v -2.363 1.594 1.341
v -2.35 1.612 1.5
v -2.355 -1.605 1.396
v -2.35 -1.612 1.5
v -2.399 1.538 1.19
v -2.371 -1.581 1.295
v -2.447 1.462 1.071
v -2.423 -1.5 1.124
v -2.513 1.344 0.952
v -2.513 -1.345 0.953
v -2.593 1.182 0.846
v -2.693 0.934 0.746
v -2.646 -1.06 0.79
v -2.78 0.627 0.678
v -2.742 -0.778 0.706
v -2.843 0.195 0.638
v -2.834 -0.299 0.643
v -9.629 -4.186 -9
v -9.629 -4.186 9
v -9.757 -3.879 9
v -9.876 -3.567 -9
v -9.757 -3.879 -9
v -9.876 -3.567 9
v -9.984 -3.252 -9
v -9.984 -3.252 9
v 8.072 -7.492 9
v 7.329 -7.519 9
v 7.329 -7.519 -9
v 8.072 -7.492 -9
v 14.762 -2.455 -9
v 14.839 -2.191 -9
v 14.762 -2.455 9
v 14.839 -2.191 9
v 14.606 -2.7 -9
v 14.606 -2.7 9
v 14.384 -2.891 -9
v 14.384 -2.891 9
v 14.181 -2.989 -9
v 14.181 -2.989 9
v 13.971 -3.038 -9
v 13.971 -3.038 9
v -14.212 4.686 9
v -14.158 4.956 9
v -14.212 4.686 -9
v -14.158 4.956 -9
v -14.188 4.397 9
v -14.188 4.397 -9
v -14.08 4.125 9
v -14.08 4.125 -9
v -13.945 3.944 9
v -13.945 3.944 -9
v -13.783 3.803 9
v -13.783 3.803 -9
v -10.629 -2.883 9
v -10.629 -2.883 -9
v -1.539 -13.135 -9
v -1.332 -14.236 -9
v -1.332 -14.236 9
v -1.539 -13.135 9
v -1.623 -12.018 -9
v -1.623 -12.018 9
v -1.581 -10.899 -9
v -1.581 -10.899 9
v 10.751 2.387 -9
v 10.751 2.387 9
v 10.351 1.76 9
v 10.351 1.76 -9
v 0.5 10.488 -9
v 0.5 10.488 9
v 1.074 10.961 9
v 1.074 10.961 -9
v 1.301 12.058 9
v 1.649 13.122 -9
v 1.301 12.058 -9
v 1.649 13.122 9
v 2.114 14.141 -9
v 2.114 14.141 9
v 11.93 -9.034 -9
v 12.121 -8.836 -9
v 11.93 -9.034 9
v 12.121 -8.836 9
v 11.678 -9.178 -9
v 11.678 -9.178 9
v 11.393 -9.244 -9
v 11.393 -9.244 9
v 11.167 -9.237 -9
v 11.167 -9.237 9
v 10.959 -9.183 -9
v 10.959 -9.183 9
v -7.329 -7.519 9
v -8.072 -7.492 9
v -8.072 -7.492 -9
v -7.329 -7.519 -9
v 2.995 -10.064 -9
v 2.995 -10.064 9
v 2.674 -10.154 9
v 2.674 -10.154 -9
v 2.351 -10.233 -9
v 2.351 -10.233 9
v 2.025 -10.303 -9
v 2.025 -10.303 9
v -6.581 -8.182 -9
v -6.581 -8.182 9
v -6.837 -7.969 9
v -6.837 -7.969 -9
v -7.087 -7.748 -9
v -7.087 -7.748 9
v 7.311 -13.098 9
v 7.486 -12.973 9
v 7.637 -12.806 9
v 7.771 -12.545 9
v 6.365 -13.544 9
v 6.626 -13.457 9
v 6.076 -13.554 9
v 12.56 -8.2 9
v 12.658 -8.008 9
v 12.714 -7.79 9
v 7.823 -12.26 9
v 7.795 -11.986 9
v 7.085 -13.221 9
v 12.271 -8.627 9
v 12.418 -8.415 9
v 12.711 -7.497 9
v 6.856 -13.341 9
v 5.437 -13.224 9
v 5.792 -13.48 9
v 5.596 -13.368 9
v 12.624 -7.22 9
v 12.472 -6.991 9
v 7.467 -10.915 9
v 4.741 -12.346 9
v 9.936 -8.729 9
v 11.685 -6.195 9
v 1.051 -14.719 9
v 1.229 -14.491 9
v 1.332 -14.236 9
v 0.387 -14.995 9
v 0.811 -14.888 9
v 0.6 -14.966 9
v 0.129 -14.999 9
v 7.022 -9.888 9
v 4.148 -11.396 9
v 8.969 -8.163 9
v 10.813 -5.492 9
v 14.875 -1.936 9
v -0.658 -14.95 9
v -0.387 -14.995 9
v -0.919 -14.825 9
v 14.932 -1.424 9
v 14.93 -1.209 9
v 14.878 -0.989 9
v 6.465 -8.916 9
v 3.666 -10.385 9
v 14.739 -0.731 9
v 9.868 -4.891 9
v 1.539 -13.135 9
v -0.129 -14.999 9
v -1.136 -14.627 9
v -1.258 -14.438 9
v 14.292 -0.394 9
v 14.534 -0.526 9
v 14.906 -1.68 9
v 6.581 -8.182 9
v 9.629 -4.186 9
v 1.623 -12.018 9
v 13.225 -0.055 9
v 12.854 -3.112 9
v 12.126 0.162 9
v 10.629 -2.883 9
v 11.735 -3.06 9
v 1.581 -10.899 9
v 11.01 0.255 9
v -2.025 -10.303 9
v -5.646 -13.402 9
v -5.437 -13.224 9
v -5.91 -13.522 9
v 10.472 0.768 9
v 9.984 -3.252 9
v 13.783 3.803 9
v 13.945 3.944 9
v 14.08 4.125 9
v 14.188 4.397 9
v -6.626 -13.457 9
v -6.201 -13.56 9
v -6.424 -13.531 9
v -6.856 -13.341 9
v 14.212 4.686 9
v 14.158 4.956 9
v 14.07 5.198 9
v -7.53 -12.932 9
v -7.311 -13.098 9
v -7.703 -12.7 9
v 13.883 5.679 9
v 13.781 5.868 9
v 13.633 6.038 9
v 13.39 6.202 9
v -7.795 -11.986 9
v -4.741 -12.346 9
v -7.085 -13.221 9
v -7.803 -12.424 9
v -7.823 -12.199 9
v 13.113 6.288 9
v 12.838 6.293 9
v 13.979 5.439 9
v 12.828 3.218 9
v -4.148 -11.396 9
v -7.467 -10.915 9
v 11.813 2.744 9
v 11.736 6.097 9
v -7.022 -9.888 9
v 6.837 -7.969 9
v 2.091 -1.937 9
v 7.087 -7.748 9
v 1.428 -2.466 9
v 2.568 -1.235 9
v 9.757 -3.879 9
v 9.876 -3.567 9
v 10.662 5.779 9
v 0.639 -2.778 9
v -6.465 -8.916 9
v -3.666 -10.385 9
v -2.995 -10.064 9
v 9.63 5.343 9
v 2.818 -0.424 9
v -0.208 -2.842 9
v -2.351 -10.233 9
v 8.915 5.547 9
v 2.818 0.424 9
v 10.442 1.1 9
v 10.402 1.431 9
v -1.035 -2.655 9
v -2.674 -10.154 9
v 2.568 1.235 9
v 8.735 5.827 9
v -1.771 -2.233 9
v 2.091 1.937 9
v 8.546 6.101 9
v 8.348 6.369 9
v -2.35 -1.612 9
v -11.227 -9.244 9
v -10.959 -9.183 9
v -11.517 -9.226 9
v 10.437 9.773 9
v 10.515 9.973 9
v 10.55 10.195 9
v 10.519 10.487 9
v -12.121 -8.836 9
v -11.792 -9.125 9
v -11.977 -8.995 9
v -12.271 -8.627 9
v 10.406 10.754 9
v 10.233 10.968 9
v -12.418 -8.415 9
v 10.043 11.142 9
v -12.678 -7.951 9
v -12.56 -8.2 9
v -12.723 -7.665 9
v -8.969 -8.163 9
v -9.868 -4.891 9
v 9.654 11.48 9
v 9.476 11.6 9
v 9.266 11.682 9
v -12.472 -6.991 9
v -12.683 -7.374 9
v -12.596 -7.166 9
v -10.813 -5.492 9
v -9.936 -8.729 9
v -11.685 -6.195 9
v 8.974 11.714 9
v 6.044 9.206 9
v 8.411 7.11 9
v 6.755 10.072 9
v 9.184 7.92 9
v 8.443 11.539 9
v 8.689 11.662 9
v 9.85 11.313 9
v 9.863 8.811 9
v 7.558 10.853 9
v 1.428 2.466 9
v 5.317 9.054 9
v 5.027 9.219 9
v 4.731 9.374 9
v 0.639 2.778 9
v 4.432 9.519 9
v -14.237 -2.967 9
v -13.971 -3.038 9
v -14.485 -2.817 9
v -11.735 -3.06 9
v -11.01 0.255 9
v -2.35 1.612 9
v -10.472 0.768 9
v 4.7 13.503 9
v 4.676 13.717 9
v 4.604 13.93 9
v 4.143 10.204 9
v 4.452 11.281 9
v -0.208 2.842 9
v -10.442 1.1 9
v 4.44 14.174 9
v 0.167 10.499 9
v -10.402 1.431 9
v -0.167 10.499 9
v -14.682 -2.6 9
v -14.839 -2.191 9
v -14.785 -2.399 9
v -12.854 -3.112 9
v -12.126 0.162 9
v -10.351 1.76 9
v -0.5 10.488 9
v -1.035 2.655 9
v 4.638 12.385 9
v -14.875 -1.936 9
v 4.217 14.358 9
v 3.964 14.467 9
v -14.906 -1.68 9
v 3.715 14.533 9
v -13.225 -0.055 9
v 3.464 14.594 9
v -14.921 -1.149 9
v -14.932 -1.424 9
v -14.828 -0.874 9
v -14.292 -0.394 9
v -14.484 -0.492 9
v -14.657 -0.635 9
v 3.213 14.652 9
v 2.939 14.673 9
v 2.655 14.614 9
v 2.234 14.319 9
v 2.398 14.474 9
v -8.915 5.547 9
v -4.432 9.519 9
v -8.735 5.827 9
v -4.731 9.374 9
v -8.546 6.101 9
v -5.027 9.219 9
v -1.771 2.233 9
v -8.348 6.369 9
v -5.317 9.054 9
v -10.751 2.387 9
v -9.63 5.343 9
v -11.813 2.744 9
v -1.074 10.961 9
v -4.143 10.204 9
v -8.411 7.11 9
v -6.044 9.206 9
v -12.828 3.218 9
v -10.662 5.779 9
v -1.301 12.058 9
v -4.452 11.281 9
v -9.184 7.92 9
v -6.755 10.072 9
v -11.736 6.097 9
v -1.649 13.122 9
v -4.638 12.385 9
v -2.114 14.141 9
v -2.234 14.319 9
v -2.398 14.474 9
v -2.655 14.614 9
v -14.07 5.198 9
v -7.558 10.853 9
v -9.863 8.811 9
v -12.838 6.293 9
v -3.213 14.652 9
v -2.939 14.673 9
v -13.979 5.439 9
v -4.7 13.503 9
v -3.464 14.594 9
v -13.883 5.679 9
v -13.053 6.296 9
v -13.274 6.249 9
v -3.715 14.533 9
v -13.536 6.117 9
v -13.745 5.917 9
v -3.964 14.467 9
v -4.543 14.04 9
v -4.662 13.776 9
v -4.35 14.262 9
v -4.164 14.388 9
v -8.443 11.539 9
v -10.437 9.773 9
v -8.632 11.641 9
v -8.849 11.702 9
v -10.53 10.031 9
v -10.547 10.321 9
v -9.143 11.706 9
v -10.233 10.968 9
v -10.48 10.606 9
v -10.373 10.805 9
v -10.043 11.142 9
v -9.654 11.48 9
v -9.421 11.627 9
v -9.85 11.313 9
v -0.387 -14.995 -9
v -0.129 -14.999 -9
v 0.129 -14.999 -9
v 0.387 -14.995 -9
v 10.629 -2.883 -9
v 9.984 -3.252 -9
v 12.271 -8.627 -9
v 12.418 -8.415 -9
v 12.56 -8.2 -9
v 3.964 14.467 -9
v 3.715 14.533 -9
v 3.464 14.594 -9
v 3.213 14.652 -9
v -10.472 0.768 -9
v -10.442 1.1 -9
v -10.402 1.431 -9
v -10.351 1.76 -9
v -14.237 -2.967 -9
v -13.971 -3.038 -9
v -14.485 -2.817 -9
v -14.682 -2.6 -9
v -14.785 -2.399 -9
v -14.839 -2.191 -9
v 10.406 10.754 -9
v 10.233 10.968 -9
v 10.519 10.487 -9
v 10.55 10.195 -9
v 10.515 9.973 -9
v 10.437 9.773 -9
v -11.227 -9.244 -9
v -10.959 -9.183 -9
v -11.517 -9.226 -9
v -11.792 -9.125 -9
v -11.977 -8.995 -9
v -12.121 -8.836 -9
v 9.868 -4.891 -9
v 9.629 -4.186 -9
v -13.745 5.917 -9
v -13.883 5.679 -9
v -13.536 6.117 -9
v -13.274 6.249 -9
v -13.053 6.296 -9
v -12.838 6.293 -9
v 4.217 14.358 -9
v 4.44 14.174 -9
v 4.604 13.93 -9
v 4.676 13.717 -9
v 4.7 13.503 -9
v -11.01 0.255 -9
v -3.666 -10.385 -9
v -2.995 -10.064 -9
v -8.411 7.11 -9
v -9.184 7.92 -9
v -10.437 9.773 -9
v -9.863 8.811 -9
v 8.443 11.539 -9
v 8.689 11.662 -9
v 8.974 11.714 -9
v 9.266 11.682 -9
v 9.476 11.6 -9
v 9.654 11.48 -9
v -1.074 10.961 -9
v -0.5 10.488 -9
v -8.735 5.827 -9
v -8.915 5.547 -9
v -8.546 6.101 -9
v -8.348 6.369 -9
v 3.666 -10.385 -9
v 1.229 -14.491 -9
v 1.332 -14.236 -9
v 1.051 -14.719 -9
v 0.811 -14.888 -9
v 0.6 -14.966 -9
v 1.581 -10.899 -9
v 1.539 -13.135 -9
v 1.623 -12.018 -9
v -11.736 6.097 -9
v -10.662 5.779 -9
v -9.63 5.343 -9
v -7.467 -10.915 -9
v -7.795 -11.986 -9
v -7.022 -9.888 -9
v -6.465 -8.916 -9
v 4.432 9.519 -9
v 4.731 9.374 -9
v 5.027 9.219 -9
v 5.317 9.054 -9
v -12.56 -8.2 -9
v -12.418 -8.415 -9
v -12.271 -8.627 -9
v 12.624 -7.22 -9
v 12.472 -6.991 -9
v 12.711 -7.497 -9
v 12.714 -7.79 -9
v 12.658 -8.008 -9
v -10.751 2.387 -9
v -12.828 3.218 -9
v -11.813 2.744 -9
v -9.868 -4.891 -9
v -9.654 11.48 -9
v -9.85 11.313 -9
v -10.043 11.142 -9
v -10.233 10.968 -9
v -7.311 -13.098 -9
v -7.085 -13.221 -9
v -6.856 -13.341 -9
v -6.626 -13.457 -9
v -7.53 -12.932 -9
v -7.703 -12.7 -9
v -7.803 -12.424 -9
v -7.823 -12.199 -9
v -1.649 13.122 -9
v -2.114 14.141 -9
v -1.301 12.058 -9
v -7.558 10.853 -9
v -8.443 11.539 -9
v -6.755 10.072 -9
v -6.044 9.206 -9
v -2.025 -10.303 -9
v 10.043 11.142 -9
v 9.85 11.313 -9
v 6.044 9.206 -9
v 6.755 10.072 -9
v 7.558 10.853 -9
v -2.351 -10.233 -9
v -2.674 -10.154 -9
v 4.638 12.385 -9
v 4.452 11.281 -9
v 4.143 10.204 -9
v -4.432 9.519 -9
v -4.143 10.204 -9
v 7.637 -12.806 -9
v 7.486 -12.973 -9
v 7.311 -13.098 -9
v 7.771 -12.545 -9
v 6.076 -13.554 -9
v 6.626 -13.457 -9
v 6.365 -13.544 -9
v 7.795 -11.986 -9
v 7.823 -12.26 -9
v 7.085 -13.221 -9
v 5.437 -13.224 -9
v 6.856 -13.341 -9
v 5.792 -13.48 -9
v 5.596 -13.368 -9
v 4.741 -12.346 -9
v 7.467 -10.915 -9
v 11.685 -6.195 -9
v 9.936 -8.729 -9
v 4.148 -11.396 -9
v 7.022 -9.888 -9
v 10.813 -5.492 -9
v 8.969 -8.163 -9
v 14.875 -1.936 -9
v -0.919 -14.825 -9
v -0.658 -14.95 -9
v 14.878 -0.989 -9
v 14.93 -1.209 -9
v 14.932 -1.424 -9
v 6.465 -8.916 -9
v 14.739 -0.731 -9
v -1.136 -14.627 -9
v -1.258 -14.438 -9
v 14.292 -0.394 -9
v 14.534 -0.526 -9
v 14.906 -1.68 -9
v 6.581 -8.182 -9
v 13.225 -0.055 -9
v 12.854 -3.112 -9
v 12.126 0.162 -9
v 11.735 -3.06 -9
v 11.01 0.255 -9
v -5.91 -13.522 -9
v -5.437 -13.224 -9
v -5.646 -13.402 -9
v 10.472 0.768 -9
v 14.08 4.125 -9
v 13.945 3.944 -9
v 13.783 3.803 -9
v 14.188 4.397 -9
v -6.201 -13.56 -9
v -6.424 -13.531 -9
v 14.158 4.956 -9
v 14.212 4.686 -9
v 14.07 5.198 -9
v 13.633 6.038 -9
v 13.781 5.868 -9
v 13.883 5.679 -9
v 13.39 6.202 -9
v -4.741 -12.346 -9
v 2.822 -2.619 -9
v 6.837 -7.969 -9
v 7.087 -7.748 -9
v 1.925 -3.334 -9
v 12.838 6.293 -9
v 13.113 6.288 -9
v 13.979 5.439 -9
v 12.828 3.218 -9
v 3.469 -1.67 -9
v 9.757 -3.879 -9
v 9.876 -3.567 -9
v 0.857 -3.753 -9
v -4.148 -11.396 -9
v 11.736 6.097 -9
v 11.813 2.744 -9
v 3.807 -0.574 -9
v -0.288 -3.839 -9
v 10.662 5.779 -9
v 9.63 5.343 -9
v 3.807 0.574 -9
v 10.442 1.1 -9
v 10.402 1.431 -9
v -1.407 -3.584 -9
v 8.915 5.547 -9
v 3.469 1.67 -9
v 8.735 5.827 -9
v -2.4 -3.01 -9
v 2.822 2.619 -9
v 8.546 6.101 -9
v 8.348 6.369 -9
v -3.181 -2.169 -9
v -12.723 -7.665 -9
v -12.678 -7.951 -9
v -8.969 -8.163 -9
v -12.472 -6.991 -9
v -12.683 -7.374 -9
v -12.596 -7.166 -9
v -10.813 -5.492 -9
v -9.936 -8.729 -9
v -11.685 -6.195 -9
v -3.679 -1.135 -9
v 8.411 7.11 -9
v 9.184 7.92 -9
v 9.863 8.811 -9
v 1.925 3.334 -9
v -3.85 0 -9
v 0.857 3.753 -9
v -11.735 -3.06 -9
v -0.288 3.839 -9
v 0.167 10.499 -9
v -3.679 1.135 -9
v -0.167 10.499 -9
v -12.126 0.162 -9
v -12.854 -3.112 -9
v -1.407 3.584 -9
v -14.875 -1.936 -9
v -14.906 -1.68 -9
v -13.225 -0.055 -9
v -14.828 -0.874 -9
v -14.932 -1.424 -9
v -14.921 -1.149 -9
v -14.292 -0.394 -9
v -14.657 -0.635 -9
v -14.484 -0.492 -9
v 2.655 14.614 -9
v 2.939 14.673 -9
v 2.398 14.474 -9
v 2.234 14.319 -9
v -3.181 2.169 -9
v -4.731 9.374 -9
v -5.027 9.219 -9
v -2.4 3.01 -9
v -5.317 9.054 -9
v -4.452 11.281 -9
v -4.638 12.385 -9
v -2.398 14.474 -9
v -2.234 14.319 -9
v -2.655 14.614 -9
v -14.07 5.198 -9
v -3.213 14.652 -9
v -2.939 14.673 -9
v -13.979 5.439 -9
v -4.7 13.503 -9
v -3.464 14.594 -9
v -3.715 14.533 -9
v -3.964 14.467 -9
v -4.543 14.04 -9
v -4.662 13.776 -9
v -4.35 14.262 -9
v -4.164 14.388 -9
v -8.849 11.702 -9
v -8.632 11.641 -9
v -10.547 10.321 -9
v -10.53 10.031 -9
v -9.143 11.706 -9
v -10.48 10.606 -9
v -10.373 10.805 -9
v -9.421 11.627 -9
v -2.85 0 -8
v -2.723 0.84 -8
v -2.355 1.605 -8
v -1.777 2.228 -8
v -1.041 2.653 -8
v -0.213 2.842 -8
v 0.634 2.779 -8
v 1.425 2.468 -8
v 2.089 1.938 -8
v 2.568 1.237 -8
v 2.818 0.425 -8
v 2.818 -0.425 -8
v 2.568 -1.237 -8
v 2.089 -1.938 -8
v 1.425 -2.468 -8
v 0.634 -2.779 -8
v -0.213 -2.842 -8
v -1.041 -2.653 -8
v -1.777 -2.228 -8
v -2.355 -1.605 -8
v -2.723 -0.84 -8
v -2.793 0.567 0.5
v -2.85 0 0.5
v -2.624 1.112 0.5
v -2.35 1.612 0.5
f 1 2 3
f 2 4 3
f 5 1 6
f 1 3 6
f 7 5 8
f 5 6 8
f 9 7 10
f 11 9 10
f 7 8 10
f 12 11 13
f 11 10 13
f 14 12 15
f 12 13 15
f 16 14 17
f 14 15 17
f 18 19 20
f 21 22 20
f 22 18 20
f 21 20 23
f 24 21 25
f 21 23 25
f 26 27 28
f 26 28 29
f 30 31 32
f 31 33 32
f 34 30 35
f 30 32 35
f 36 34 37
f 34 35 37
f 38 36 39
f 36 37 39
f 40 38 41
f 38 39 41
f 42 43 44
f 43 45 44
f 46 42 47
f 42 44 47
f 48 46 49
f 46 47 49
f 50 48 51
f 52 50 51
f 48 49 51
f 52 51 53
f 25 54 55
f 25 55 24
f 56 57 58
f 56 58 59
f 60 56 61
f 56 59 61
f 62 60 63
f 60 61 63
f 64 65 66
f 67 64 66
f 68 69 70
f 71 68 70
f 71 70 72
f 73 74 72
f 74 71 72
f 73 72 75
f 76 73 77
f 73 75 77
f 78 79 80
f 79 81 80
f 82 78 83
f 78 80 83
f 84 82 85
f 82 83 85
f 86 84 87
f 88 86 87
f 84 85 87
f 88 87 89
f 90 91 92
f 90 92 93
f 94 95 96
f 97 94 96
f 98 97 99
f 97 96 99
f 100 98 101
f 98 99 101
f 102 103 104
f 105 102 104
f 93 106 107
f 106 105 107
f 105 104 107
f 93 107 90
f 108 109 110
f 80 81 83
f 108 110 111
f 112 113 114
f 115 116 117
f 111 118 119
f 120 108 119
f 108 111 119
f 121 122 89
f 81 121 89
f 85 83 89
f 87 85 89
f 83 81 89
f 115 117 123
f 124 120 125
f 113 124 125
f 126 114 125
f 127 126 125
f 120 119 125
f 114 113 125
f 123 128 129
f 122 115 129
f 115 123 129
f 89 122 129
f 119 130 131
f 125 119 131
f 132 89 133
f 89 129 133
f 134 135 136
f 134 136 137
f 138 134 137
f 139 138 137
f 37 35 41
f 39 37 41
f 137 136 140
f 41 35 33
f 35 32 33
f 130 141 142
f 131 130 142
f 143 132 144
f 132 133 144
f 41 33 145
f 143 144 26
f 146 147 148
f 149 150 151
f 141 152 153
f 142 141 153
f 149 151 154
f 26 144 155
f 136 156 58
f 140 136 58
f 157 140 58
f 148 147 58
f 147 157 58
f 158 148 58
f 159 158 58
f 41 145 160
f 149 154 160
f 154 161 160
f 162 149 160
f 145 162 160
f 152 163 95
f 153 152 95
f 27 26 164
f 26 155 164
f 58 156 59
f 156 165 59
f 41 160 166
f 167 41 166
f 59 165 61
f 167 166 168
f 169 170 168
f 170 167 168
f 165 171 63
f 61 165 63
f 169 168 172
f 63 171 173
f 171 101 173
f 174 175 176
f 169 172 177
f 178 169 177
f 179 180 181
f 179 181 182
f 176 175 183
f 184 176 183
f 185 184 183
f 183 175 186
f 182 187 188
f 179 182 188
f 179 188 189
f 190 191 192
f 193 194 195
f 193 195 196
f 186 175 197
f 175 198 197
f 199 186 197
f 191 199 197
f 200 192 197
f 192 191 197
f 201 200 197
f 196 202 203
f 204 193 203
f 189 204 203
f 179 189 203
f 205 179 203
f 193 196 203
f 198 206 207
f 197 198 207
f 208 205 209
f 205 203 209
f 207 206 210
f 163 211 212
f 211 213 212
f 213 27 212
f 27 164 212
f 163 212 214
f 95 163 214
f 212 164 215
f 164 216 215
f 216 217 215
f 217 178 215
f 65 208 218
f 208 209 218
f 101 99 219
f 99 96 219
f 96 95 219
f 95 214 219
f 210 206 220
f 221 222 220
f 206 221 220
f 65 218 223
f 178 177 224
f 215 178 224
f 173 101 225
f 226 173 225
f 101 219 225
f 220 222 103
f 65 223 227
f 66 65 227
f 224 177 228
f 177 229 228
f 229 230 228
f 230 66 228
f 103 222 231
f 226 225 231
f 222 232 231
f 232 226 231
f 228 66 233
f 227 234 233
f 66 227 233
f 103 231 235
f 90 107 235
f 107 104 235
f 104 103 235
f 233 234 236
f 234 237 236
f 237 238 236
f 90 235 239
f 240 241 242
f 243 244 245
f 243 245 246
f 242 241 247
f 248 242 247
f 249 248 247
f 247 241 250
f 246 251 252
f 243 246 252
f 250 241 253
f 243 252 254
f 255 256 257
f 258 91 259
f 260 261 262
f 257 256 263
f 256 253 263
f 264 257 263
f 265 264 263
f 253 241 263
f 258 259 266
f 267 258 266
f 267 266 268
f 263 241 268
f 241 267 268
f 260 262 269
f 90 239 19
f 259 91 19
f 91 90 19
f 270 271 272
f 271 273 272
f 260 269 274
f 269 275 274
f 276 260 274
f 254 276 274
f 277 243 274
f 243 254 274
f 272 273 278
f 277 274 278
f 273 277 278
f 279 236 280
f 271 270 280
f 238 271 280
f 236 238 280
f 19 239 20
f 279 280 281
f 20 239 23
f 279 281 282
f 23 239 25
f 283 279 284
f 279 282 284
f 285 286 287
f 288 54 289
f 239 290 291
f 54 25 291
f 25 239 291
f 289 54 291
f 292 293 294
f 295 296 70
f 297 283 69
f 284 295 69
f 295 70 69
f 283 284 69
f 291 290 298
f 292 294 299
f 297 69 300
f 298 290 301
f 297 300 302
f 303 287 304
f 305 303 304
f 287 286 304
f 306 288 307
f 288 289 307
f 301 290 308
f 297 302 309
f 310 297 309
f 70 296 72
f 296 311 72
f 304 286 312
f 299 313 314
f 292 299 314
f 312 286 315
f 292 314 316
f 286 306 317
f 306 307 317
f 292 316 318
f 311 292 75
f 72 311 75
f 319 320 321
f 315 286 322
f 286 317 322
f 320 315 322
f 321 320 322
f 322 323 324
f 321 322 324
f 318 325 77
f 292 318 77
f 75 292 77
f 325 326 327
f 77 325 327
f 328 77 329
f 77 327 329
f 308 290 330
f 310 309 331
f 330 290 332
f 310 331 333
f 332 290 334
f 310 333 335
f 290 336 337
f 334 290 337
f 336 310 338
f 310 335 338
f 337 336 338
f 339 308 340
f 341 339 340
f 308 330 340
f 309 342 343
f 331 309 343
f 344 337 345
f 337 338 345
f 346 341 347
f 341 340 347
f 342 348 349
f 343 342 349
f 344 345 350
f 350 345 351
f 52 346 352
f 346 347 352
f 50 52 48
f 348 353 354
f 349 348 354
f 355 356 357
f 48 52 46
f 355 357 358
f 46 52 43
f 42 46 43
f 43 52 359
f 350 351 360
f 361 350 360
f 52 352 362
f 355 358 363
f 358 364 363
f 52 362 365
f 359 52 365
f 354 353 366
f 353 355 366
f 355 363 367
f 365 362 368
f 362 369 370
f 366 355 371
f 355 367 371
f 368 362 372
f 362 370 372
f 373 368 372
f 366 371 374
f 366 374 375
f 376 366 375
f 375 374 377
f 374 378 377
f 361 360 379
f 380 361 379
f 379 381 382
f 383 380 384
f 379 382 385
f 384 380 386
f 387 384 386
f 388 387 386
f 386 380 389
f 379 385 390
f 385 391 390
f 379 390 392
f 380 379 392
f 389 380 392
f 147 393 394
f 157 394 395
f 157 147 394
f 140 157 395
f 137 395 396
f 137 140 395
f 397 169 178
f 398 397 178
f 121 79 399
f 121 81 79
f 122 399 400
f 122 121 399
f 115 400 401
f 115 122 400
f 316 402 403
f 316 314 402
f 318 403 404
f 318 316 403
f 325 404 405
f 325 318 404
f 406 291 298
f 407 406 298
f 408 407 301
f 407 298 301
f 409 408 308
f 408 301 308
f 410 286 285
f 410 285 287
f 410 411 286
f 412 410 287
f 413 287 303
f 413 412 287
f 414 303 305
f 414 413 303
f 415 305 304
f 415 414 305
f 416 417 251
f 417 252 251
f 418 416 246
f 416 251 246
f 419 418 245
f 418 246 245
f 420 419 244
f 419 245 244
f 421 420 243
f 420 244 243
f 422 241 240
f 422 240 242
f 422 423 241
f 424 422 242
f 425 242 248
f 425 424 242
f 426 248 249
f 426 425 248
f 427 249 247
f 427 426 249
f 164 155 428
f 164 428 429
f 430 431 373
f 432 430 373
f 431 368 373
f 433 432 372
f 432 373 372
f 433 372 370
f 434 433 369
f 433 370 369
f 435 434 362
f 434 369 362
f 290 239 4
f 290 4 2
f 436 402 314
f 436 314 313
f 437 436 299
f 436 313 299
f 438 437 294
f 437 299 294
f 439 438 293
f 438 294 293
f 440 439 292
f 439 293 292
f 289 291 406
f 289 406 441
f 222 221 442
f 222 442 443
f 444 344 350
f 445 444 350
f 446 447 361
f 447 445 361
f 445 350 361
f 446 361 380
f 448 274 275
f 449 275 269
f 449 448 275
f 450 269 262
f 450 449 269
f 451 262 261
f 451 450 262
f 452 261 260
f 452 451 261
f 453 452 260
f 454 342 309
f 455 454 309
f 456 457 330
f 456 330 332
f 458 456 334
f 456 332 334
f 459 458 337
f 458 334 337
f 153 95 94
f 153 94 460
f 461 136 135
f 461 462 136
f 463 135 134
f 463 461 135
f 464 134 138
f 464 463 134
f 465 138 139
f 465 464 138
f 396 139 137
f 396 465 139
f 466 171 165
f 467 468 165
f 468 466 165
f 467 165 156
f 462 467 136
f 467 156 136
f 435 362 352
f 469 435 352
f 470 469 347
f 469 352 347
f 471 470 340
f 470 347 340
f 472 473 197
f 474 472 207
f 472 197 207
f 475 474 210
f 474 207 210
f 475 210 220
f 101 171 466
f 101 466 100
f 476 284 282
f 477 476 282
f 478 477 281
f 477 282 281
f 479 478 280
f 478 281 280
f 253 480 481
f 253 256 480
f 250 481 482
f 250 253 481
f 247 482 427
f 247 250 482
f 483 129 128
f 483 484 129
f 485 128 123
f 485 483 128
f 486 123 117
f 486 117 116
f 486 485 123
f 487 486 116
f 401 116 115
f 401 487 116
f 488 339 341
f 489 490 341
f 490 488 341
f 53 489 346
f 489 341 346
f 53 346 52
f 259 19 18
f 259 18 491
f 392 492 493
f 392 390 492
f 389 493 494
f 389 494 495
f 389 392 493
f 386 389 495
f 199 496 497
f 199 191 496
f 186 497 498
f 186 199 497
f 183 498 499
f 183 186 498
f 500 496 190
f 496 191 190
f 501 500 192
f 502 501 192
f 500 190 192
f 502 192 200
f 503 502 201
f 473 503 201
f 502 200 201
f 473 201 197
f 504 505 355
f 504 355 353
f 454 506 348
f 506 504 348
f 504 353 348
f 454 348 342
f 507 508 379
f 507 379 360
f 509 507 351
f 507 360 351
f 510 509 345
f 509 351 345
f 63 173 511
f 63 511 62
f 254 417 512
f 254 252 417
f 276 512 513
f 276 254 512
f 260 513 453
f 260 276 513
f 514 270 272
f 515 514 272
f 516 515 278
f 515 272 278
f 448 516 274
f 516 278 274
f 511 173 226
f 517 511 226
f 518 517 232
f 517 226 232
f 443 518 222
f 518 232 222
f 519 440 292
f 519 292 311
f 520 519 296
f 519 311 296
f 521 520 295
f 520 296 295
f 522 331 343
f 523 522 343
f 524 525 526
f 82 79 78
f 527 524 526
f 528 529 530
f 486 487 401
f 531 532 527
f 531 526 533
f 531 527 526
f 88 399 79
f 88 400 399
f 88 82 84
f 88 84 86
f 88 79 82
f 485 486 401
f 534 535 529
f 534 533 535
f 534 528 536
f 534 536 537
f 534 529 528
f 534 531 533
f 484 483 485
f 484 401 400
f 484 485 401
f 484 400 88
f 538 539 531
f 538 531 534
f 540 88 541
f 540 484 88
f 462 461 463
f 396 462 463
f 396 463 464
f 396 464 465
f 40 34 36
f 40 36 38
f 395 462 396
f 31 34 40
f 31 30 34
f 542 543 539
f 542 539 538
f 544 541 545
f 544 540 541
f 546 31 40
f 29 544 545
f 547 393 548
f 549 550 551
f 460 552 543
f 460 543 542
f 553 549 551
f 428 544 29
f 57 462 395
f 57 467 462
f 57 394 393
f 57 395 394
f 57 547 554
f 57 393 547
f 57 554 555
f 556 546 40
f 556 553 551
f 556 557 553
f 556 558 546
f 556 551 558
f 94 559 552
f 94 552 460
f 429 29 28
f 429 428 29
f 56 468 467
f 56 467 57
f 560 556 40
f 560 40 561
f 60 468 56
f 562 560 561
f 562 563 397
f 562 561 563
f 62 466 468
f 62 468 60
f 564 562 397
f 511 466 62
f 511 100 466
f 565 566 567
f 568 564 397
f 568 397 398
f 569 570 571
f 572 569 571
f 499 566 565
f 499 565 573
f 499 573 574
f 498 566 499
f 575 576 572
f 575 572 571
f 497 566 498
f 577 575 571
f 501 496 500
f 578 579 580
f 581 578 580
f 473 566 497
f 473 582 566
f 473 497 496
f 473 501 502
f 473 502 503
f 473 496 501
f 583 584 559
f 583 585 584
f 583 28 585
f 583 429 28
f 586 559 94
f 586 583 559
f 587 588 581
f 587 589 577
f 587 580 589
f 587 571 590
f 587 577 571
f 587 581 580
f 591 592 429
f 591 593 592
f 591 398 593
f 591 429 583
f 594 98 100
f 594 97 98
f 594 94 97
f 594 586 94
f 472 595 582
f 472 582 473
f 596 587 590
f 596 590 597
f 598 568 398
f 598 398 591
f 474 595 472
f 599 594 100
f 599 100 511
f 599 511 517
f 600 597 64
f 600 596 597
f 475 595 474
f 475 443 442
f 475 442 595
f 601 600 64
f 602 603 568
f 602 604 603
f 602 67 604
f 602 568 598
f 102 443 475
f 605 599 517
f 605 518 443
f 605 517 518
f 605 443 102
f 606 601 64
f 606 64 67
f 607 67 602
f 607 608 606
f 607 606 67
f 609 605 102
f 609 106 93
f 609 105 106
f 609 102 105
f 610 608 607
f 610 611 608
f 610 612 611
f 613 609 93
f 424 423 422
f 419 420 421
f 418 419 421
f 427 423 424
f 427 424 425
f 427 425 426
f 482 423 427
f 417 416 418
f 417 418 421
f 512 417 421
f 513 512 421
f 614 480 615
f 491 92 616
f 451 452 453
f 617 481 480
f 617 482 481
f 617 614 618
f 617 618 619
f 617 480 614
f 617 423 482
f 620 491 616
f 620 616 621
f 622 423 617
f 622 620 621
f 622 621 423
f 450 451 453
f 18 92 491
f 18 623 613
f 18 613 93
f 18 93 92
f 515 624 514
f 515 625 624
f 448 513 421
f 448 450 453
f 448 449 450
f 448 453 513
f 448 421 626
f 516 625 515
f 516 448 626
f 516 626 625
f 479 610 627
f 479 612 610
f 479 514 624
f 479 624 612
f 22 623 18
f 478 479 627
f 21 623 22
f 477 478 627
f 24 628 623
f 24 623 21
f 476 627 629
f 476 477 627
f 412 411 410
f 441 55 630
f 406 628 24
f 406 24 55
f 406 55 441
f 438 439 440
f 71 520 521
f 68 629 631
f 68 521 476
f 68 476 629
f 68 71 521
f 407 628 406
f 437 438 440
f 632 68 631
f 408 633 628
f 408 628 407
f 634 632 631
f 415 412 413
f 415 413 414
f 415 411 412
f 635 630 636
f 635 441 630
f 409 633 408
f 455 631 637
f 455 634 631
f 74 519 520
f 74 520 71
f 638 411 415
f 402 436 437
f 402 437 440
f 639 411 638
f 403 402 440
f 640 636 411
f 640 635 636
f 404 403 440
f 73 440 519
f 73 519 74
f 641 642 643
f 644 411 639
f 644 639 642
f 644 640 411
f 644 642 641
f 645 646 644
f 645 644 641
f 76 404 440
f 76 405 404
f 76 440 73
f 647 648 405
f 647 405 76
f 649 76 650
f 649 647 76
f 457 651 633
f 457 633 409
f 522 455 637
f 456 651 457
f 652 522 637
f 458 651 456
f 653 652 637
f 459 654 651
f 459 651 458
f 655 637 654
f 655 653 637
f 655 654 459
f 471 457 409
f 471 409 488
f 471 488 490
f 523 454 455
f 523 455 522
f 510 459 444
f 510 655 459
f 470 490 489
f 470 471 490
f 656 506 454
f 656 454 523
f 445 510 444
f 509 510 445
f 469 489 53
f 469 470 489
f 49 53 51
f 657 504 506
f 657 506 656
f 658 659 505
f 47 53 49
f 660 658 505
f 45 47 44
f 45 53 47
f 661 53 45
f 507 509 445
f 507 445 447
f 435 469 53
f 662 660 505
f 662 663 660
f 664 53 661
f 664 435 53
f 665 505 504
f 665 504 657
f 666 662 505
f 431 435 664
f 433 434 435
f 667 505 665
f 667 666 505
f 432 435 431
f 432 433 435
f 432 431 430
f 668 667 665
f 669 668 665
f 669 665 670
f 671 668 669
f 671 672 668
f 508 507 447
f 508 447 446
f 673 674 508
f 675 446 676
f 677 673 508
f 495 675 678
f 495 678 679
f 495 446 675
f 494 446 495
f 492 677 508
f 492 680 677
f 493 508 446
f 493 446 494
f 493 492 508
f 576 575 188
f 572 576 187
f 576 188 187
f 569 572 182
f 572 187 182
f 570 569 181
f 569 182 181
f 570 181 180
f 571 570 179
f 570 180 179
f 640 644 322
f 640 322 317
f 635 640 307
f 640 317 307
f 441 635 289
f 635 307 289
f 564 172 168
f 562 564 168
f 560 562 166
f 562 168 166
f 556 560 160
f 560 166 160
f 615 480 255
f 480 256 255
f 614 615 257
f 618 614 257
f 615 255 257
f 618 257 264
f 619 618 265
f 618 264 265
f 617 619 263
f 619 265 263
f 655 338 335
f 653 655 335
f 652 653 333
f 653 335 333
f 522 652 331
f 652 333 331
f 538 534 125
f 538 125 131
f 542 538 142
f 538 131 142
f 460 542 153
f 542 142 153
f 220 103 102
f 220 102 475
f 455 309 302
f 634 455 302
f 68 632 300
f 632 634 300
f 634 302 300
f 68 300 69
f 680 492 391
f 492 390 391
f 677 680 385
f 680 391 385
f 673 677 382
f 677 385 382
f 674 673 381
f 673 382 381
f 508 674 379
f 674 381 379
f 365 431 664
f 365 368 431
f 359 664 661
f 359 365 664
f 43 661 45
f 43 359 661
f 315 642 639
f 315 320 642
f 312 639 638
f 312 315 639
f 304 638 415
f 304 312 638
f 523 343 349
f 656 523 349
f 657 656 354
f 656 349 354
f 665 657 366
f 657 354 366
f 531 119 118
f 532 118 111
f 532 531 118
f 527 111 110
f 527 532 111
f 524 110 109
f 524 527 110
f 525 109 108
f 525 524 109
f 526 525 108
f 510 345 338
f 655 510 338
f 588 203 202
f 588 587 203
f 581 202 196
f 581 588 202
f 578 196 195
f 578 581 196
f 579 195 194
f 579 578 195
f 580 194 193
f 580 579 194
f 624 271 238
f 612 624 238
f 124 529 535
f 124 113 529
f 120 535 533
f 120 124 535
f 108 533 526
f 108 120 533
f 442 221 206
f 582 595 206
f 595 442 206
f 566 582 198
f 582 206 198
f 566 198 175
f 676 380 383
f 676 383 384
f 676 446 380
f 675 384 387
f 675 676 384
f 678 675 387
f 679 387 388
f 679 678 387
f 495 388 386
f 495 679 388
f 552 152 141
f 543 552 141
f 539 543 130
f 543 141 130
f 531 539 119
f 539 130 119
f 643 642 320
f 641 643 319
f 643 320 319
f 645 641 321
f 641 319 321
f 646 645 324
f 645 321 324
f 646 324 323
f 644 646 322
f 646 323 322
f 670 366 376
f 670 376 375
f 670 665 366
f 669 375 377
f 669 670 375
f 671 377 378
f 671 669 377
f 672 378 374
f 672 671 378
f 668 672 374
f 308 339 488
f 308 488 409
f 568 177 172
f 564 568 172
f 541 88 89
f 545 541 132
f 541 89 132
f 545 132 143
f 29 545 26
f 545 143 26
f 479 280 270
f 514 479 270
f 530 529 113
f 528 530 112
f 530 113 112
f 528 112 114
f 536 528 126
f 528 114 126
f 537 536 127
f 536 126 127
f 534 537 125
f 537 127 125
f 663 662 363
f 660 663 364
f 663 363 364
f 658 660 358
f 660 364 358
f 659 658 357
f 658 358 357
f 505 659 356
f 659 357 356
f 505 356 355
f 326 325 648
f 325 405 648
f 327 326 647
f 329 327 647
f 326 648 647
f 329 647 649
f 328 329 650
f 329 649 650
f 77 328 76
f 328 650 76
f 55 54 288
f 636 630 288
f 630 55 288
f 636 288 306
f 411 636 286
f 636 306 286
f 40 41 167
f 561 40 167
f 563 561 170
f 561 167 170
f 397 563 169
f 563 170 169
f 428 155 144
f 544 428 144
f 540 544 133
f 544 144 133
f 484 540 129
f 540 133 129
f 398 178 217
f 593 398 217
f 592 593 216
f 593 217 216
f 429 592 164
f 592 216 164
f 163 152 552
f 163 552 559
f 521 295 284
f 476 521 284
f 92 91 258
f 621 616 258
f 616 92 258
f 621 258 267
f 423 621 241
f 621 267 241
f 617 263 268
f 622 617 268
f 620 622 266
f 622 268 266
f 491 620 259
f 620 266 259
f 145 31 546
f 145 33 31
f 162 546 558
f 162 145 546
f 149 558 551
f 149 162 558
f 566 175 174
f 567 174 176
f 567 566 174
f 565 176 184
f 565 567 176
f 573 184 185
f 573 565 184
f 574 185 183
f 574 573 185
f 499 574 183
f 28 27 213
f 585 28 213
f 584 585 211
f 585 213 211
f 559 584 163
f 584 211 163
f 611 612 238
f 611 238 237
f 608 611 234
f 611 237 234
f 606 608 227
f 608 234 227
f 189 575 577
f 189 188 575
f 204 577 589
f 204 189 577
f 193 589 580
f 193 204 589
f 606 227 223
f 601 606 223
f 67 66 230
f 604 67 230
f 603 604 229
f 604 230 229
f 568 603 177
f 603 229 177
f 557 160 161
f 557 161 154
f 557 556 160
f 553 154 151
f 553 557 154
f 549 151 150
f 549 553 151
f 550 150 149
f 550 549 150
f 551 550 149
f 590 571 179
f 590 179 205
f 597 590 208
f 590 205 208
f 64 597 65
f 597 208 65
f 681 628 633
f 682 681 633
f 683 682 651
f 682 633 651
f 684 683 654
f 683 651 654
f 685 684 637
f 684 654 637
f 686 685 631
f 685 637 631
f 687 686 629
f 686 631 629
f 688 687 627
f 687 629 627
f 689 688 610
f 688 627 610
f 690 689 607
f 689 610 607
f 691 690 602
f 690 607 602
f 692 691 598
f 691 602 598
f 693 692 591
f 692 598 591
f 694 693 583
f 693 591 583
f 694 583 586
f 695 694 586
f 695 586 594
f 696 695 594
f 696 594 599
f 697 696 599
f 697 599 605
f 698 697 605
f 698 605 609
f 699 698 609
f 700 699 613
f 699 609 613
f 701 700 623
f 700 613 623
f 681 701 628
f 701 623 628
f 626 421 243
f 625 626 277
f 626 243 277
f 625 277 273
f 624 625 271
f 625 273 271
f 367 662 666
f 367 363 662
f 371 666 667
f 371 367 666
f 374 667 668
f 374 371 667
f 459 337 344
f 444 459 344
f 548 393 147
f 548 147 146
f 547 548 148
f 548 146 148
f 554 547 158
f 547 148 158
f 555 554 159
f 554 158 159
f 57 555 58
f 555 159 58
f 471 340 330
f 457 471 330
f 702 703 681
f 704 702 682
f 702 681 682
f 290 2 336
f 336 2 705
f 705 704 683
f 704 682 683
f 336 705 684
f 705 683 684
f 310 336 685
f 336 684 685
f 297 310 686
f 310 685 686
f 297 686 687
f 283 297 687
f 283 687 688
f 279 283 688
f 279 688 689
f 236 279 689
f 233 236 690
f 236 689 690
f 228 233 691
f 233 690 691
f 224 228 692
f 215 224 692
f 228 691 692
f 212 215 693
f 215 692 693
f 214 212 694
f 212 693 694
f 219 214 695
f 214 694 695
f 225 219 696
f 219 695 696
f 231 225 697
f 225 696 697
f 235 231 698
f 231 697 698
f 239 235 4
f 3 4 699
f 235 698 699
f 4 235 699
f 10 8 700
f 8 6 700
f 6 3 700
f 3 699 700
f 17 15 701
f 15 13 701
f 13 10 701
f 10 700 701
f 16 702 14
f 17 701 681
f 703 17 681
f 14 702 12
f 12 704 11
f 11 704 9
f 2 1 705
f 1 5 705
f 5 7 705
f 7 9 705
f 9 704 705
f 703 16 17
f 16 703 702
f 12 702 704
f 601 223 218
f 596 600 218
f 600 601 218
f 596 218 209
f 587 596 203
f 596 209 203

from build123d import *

# Parameters (mm, degrees)
SKETCH1_R           = 15
BOSS_EXTRUDE1_DEPTH = 9
CUT_EXTRUDE1_DEPTH  = 24.043437244
CIRPATTERN1_COUNT   = 13
FILLET1_R           = 1
SKETCH3_R           = 2.85
CUT_EXTRUDE2_DEPTH  = 24
BOSS_EXTRUDE2_DEPTH = 8.5
FILLET3_R           = 1
CHAMFER2_SIZE       = 1


with BuildPart() as part:
    # Sketch1 → Boss-Extrude1 (new, symmetric)
    with BuildSketch(Plane.XY):
        Circle(SKETCH1_R)
    extrude(amount=BOSS_EXTRUDE1_DEPTH, both=True)

    # Sketch2 → Cut-Extrude1 (cut, symmetric)
    with BuildSketch(Plane.XY):
        with BuildLine():
            Line((2.488704723, 14.792104272), (2.488704723, 15.173999235))
            Line((2.488704723, 15.173999235), (-2.614354336, 15.173999235))
            Line((-2.614354336, 15.173999235), (-2.488704723, 14.792104272))
            ThreePointArc((-2.488704723, 14.792104272), (-1.497391845, 12.707607266), (-1.01110734, 10.451203852))
            ThreePointArc((-1.01110734, 10.451203852), (0, 10.5), (1.01110734, 10.451203852))
            ThreePointArc((1.01110734, 10.451203852), (1.497391845, 12.707607266), (2.488704723, 14.792104272))
        make_face()
    cut_extrude1 = extrude(amount=CUT_EXTRUDE1_DEPTH, both=True, mode=Mode.SUBTRACT)

    # CirPattern1: Cut-Extrude1 ×13 about axis
    cirpattern1_axis = Axis((0, 0, 0), (0, 0, 1))
    for i in range(1, CIRPATTERN1_COUNT):
        add(cut_extrude1.rotate(cirpattern1_axis, i * 360 / CIRPATTERN1_COUNT), mode=Mode.SUBTRACT)

    # Fillet1
    fillet1_edges = [part.edges().sort_by_distance(p)[0] for p in [
        (11.67180174, -9.421732544, 0),
        (7.946157272, -12.722365527, 0),
        (14.713364615, -2.918373125, 0),
        (-2.488704723, 14.792104272, 0),
        (12.948350901, -7.572331804, 0),
        (5.956369747, -13.766686582, 0),
        (1.123594773, -14.95785863, 0),
        (2.488704723, 14.792104272, 0),
        (-1.123594773, -14.95785863, 0),
        (-5.956369747, -13.766686582, 0),
        (-12.948350901, -7.572331804, 0),
        (-14.713364615, -2.918373125, 0),
        (-7.946157272, -12.722365527, 0),
        (-11.67180174, -9.421732544, 0),
        (-9.077872212, 11.941199107, 0),
        (-4.670595026, 14.254316613, 0),
        (-13.587408577, 6.354709133, 0),
        (-10.759917741, 10.451036801, 0),
        (-14.984233383, -0.68756812, 0),
        (-14.384272972, 4.253550406, 0),
        (4.670595026, 14.254316613, 0),
        (9.077872212, 11.941199107, 0),
        (10.759917741, 10.451036801, 0),
        (13.587408577, 6.354709133, 0),
        (14.384272972, 4.253550406, 0),
        (14.984233383, -0.68756812, 0),
    ]]
    fillet(fillet1_edges, radius=FILLET1_R)

    # Chamfer1
    # the kernel refuses this chamfer: 0.5 mm, written as the material it adds along each edge
    with BuildSketch(Plane(origin=(7.687254792, -7.152350227, 9), x_dir=(-0.6988462718759633, -0.7152718981513725, 0), z_dir=(0, 0, -1)), Plane(origin=(3.482863191, -9.905537037, 9), x_dir=(-0.9512010678205252, -0.3085717559613855, 0), z_dir=(0, 0, -1)), Plane(origin=(-1.519410394, -10.389484687, 9), x_dir=(-0.9856471623429421, 0.16881845682657493, 0), z_dir=(0, 0, -1)), Plane(origin=(-9.413501753, -4.651449748, 9), x_dir=(-0.42097653940929197, 0.9070715259928386, 0), z_dir=(0, 0, -1)), Plane(origin=(-6.173605368, -8.493326601, 9), x_dir=(-0.7942933703085662, 0.6075343956385179, 0), z_dir=(0, 0, -1)), Plane(origin=(-10.496878331, 0.256018188, 9), x_dir=(0.048780943351376956, 0.998809501139106, 0), z_dir=(0, 0, -1))) as chamfer1_piece_1:
        with BuildLine():
            Line((0.512668458, 0), (-0.025719054, -0.512719416))
            ThreePointArc((-0.025719054, -0.512719416), (-0.009930751, -0.26377362), (0, 0))
            ThreePointArc((0, 0), (0.263582733, -0.00312688), (0.512668458, 0))
        make_face()
    extrude(amount=18)
    with BuildSketch(Plane(origin=(6.173605368, -8.493326601, 9), x_dir=(0.5669781411868423, -0.8237328374031918, 0), z_dir=(0, 0, -1)), Plane(origin=(9.413501753, -4.651449748, 9), x_dir=(0.8848419486421701, -0.4658913241552447, 0), z_dir=(0, 0, -1)), Plane(origin=(1.519410394, -10.389484687, 9), x_dir=(0.11922647441292282, -0.9928670846589006, 0), z_dir=(0, 0, -1)), Plane(origin=(-3.482863191, -9.905537037, 9), x_dir=(-0.3558385408142222, -0.934547448164728, 0), z_dir=(0, 0, -1)), Plane(origin=(-10.130588961, -2.760646175, 9), x_dir=(-0.971256802316475, -0.23803408149669583, 0), z_dir=(0, 0, -1)), Plane(origin=(-7.687254792, -7.152350227, 9), x_dir=(-0.7493852346601237, -0.6621342538136743, 0), z_dir=(0, 0, -1)), Plane(origin=(-10.253127286, 2.263488646, 9), x_dir=(-0.9706251414754602, 0.24059683026952544, 0), z_dir=(0, 0, -1))) as chamfer1_piece_2:
        with BuildLine():
            Line((0.513364071, 0), (-0.025684204, -0.512024677))
            ThreePointArc((-0.025684204, -0.512024677), (-0.010082291, -0.263408394), (0, 0))
            ThreePointArc((0, 0), (0.263939908, -0.003296528), (0.513364071, 0))
        make_face()
    extrude(amount=18)
    with BuildSketch(Plane(origin=(-1.01110734, 10.451203852, 9), x_dir=(-0.12184667616261032, 0.9925489345660113, 0), z_dir=(0, 0, -1)), Plane(origin=(10.130588961, -2.760646175, 9), x_dir=(0.9712568023164747, -0.2380340814966975, 0), z_dir=(0, 0, -1)), Plane(origin=(-5.752207693, 8.784196415, 9), x_dir=(-0.569150362894187, 0.822233461017864, 0), z_dir=(0, 0, -1)), Plane(origin=(-9.175546584, 5.104835441, 9), x_dir=(-0.8860685604921126, 0.46355421053792145, 0), z_dir=(0, 0, -1)), Plane(origin=(3.961625519, 9.723966436, 9), x_dir=(0.35337061566617867, 0.9354834087164272, 0), z_dir=(0, 0, -1)), Plane(origin=(8.026797714, 6.769085497, 9), x_dir=(0.7476349580234212, 0.664109907727115, 0), z_dir=(0, 0, -1)), Plane(origin=(10.253127286, 2.263488646, 9), x_dir=(0.9706251414754612, 0.24059683026952128, 0), z_dir=(0, 0, -1))) as chamfer1_piece_3:
        with BuildLine():
            Line((0.513364071, 0), (-0.025684204, 0.512024677))
            ThreePointArc((-0.025684204, 0.512024677), (-0.010082291, 0.263408394), (0, 0))
            ThreePointArc((0, 0), (0.263939908, 0.003296528), (0.513364071, 0))
        make_face()
    extrude(amount=18)
    with BuildSketch(Plane(origin=(1.01110734, 10.451203852, 9), x_dir=(-0.9974069482855394, 0.07196790612298887, 0), z_dir=(0, 0, -1)), Plane(origin=(-3.961625519, 9.723966436, 9), x_dir=(-0.916605146006636, -0.39979370469550085, 0), z_dir=(0, 0, -1)), Plane(origin=(-8.026797714, 6.769085497, 9), x_dir=(-0.6258201510670891, -0.7799673958047002, 0), z_dir=(0, 0, -1)), Plane(origin=(5.752207693, 8.784196415, 9), x_dir=(-0.8497148387689841, 0.5272425369560002, 0), z_dir=(0, 0, -1)), Plane(origin=(9.175546584, 5.104835441, 9), x_dir=(-0.5073632998643495, 0.8617322565337555, 0), z_dir=(0, 0, -1)), Plane(origin=(10.496878331, 0.256018188, 9), x_dir=(-0.04878094335137992, 0.9988095011391058, 0), z_dir=(0, 0, -1))) as chamfer1_piece_4:
        with BuildLine():
            Line((0.512668458, 0), (-0.025719054, 0.512719416))
            ThreePointArc((-0.025719054, 0.512719416), (-0.009930751, 0.26377362), (0, 0))
            ThreePointArc((0, 0), (0.263582733, 0.00312688), (0.512668458, 0))
        make_face()
    extrude(amount=18)

    # Sketch3 → Cut-Extrude2 (cut)
    with BuildSketch(Plane(origin=(0, 0, -9), x_dir=(-1, 0, 0), z_dir=(0, 0, -1))):
        Circle(SKETCH3_R)
    extrude(amount=-CUT_EXTRUDE2_DEPTH, mode=Mode.SUBTRACT)

    # Sketch5 → Boss-Extrude2 (add)
    with BuildSketch(Plane.XY.offset(9)):
        Polygon((-2.35, 0), (-2.35, 1.61245155), (-2.85, 1.61245155), (-2.85, -1.61245155), (-2.35, -1.61245155), align=None)
    extrude(amount=-BOSS_EXTRUDE2_DEPTH)

    # Fillet3
    # the kernel refuses this fillet: 1 mm, written as the material it takes off along each edge
    with BuildSketch(Plane(origin=(-2.35, -4.11245155, 0.5), x_dir=(-1, 0, 0), z_dir=(0, 1, 0))) as fillet3_piece_1_section:
        with BuildLine():
            CenterArc((FILLET3_R, FILLET3_R), FILLET3_R, 180, 90)
            Line((0, FILLET3_R), (0, 0))
            Line((0, 0), (FILLET3_R, 0))
        make_face()
    fillet3_piece_1 = extrude(amount=8.224903099, mode=Mode.PRIVATE)
    fillet3_piece_1 = fillet3_piece_1 & Plane(origin=(0, 0, 0.5), x_dir=(-1, 0, 0), z_dir=(0, 0, -1)) * Cylinder(2.85, 21, mode=Mode.PRIVATE)
    add(fillet3_piece_1, mode=Mode.SUBTRACT)

    # Chamfer2
    chamfer2_edges = [part.edges().sort_by_distance(p)[0] for p in [
        (2.85, 0, -9),
    ]]
    chamfer(chamfer2_edges, length=CHAMFER2_SIZE)


solid = part.part
